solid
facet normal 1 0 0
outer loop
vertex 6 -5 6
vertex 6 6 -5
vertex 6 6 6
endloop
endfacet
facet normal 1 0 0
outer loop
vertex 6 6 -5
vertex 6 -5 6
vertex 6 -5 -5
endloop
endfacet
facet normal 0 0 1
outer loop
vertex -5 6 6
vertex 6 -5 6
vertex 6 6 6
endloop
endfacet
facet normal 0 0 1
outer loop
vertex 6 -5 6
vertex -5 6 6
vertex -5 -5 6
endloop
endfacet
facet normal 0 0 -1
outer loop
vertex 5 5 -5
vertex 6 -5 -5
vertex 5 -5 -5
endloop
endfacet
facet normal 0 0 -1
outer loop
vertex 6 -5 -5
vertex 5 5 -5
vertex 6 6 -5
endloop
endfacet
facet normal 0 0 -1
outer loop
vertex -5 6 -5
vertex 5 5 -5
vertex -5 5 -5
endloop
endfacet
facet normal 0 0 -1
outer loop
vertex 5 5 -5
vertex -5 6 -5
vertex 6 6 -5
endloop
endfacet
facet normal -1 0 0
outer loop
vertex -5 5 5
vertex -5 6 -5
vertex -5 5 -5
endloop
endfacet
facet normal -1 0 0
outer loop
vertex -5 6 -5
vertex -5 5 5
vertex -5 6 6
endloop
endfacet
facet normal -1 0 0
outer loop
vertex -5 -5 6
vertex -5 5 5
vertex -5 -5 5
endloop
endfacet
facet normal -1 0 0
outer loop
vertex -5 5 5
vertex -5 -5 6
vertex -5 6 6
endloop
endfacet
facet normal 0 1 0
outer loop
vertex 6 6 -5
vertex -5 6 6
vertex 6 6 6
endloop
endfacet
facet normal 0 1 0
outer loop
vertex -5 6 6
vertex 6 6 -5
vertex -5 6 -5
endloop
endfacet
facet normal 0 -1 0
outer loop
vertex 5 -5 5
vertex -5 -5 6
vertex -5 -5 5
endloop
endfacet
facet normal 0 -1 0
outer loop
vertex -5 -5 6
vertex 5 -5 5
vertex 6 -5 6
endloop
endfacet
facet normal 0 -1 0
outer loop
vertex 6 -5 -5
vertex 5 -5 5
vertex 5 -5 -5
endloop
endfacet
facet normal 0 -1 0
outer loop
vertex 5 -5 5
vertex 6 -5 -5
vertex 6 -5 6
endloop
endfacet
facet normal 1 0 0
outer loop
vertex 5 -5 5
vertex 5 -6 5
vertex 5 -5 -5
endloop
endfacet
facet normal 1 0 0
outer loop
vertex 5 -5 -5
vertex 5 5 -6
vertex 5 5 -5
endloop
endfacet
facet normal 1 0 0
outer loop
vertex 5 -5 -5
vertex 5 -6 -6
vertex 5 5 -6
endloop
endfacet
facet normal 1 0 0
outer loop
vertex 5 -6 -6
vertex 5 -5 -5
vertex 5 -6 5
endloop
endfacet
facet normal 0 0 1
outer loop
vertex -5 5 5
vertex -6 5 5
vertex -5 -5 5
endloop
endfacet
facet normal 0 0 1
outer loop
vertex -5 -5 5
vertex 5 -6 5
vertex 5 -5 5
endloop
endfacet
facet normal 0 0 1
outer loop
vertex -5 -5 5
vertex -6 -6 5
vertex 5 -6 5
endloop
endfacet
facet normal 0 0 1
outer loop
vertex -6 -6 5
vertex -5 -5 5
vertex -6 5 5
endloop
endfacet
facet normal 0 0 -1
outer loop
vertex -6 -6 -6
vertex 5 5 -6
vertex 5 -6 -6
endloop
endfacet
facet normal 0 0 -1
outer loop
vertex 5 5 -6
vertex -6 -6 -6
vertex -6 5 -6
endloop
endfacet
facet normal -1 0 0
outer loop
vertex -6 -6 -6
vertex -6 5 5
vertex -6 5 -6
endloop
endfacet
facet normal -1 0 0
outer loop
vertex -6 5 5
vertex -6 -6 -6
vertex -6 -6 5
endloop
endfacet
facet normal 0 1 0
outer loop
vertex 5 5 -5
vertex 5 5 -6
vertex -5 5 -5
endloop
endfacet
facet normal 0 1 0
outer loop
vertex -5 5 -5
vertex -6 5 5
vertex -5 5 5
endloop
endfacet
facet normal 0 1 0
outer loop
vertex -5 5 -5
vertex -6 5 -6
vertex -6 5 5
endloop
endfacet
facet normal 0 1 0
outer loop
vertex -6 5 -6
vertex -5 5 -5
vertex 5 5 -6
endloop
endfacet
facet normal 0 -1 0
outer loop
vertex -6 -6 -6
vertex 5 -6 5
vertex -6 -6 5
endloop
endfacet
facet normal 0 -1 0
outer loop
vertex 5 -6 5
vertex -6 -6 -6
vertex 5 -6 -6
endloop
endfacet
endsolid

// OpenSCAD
// Unit of length: Unit.MM
union()
{
   color(c = [1.0, 0.0, 0.0, 1.0])
   {
      translate(v = [0.5, 0.5, 0.5])
      {
         cube(size = 11.0, center = true);
      }
   }
   translate(v = [-0.5, -0.5, -0.5])
   {
      cube(size = 11.0, center = true);
   }
}
